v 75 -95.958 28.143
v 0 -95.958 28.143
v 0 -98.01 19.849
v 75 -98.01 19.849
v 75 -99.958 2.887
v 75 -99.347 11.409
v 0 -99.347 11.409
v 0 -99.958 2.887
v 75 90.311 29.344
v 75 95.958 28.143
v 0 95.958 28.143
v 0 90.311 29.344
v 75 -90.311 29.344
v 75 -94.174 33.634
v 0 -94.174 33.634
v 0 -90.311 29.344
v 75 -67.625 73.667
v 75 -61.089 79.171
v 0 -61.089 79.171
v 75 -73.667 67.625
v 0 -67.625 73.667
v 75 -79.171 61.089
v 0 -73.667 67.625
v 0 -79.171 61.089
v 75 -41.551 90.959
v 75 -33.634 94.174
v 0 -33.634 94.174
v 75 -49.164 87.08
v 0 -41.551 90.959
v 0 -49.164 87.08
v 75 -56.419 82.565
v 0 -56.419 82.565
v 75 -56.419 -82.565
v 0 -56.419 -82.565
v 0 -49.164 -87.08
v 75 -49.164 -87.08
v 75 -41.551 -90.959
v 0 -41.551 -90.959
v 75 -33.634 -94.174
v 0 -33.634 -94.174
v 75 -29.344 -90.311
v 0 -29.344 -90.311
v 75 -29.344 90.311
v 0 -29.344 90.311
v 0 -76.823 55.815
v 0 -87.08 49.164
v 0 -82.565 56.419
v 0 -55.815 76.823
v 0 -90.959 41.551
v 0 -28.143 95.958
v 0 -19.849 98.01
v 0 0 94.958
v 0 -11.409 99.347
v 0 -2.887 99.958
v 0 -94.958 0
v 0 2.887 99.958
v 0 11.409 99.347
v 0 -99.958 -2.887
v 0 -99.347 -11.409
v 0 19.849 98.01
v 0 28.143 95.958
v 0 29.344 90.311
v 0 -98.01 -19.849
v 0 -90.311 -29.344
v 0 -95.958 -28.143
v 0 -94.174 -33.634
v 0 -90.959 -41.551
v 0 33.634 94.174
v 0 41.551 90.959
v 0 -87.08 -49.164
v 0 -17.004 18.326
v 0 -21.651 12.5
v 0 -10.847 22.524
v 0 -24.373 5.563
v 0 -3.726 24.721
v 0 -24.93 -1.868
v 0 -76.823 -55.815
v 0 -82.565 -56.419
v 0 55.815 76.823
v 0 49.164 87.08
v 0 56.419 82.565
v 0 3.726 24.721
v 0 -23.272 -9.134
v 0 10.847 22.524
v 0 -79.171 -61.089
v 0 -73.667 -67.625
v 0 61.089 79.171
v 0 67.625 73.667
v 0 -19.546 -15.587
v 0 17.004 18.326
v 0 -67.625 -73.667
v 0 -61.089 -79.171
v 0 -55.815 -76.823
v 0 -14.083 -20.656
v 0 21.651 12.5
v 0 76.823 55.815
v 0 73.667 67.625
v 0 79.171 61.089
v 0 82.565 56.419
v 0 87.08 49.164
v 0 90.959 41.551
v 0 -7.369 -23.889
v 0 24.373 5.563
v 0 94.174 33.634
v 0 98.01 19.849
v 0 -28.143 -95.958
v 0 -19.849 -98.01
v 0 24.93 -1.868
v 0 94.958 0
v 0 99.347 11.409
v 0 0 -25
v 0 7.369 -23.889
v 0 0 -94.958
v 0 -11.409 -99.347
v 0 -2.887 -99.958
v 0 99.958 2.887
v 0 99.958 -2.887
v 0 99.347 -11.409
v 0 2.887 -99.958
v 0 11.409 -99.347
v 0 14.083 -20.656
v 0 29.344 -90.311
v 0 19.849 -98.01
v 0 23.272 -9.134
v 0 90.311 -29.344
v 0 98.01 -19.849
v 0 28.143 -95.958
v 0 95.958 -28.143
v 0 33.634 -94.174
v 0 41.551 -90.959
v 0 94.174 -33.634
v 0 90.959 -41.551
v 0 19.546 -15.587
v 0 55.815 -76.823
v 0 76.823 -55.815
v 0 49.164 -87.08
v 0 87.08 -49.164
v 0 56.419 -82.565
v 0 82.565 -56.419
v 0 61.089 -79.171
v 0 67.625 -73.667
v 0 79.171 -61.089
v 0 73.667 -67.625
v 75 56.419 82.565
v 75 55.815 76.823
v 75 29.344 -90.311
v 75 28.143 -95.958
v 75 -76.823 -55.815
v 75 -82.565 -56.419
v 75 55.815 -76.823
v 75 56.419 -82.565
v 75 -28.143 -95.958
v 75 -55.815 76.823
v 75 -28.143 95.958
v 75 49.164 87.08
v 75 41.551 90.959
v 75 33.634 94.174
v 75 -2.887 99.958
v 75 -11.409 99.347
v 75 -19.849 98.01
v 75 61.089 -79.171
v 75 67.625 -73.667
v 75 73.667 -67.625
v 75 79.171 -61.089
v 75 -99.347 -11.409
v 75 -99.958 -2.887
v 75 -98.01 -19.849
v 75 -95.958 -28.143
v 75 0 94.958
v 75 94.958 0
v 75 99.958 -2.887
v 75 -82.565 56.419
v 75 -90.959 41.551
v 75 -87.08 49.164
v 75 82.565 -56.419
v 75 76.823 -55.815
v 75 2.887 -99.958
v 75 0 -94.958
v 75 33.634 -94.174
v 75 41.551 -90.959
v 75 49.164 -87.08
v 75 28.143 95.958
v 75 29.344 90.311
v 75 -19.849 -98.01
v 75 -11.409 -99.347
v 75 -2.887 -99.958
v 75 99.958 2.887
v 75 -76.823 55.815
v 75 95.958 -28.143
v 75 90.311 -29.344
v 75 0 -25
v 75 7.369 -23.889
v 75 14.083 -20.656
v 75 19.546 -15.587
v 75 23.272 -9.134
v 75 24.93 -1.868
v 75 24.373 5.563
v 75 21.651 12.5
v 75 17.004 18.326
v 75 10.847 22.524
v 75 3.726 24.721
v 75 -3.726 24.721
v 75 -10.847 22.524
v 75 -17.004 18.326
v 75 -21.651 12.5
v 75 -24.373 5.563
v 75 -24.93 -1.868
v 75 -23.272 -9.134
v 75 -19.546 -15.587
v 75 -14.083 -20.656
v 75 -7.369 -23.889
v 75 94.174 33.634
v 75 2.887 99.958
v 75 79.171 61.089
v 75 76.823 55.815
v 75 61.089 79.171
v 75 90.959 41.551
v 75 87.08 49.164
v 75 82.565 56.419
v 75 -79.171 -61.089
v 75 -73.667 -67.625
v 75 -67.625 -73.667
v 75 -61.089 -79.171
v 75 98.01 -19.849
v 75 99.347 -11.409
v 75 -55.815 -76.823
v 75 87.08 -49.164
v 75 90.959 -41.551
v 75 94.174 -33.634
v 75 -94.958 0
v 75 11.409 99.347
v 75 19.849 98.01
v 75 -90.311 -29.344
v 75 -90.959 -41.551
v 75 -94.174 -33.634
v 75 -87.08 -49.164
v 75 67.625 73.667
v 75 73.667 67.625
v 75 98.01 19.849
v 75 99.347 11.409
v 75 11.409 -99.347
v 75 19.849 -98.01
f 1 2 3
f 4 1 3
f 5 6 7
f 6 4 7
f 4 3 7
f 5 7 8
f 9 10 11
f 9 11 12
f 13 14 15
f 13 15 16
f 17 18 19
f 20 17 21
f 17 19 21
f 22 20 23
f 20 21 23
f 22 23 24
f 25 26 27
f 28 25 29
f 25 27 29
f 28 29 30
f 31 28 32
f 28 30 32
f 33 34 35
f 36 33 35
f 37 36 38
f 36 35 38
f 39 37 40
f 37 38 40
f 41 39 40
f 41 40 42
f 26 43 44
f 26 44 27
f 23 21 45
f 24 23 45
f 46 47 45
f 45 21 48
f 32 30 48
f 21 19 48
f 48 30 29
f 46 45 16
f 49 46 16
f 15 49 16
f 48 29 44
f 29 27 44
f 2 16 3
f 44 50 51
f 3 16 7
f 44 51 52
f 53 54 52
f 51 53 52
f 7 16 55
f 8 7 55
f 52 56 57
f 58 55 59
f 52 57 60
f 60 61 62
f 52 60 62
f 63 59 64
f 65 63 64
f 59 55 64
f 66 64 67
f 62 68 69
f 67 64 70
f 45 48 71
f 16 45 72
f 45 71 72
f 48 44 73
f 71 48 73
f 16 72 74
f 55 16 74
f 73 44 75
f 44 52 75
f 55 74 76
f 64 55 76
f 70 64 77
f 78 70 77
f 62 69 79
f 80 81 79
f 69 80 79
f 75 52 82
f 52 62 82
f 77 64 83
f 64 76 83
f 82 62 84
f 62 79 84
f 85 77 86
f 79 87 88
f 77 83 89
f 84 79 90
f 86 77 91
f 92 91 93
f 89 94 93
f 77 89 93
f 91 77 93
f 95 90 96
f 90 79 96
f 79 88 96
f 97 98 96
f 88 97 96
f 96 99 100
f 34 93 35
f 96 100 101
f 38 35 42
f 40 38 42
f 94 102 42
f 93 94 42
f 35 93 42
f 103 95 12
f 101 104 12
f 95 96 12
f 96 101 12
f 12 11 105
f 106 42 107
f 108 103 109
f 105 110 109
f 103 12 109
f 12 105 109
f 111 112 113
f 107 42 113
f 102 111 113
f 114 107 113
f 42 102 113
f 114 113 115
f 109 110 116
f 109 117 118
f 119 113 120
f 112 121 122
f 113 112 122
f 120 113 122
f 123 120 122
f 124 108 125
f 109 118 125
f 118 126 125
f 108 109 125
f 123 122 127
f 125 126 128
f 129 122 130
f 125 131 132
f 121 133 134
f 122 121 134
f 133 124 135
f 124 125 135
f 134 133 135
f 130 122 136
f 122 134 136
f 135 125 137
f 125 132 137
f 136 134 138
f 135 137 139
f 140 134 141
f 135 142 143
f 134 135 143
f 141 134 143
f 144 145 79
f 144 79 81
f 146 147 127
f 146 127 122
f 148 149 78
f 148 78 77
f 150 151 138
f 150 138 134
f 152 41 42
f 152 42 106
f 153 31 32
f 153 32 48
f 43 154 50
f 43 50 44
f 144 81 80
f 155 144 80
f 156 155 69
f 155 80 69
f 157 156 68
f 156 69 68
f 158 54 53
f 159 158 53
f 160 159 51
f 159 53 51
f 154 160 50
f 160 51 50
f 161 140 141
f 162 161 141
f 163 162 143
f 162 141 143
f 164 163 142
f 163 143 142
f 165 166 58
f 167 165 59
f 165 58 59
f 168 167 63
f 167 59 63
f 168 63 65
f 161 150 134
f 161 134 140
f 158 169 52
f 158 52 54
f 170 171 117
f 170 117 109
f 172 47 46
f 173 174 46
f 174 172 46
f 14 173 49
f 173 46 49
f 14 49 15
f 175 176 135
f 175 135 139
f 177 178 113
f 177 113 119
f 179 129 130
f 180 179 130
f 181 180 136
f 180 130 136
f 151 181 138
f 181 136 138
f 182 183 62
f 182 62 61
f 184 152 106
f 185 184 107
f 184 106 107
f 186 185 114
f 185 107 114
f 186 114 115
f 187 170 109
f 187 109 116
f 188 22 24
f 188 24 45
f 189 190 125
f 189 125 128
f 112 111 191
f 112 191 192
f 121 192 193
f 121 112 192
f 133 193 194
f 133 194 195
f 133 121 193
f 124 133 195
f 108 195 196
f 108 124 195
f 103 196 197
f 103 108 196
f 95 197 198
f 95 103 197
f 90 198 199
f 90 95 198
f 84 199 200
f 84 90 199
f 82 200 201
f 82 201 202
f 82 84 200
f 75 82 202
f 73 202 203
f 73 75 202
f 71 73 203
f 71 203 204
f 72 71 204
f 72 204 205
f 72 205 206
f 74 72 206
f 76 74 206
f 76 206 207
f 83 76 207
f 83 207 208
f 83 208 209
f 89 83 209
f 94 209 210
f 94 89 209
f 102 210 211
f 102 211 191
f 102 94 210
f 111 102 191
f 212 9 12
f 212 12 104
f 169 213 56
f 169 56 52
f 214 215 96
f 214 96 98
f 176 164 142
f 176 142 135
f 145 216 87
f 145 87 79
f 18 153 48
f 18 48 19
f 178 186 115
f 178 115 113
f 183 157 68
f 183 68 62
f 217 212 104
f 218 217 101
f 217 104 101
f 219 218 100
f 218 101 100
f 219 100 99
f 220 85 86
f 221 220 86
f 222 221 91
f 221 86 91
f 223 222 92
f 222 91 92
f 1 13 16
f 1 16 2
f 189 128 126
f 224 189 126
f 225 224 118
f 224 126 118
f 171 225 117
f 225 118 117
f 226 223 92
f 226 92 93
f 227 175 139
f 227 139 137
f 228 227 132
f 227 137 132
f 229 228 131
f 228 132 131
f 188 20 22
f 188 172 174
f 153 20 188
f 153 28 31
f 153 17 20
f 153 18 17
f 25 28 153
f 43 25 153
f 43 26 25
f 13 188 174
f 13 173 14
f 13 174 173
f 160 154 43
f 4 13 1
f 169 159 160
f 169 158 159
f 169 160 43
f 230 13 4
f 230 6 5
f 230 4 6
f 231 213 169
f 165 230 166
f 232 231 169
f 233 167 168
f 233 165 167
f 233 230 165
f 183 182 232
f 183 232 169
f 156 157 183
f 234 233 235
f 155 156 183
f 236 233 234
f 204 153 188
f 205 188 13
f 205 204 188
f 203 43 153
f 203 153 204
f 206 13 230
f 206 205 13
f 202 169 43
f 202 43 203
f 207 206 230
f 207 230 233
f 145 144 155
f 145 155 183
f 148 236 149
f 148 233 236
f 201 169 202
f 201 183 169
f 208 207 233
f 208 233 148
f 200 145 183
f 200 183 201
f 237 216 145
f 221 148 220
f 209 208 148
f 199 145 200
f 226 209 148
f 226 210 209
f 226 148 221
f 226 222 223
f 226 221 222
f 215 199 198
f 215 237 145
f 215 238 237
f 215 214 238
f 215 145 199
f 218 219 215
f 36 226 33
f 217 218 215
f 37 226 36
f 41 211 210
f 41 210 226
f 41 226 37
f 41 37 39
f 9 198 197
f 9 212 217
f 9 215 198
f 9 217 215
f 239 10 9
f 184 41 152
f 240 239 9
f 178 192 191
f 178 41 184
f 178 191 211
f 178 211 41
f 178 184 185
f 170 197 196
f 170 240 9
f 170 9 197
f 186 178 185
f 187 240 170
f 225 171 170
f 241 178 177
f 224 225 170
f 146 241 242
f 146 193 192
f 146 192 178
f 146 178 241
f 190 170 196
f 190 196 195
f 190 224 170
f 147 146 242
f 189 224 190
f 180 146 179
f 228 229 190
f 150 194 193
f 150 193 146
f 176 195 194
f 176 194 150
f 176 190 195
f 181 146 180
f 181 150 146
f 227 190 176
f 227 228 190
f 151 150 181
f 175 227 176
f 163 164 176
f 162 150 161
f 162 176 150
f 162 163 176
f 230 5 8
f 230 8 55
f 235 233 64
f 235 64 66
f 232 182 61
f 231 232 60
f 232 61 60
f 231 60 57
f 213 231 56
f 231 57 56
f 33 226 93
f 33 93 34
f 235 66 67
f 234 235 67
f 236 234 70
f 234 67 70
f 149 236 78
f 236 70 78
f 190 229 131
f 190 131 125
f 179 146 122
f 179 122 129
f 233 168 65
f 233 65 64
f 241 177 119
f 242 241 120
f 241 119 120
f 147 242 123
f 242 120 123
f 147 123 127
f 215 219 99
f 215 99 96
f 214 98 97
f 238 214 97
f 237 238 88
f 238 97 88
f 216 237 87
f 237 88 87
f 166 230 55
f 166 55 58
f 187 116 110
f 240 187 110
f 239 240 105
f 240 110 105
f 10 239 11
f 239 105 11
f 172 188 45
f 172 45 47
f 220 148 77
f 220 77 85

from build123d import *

# Parameters (mm, degrees)
SKETCH1_R           = 100
SKETCH1_R_2         = 25
BOSS_EXTRUDE1_DEPTH = 75
CUT_EXTRUDE1_DEPTH  = 161.078105936
CIRPATTERN1_COUNT   = 20


with BuildPart() as part:
    # Sketch1 → Boss-Extrude1 (new body)
    with BuildSketch(Plane(origin=(0, 0, 0), x_dir=(0, 0, -1), z_dir=(1, 0, 0))):
        Circle(SKETCH1_R)
        Circle(SKETCH1_R_2, mode=Mode.SUBTRACT)
    extrude(amount=BOSS_EXTRUDE1_DEPTH)

    # Sketch2 → Cut-Extrude1 (cut, through all)
    with BuildSketch(Plane(origin=(75, 0, 0), x_dir=(0, 0, -1), z_dir=(1, 0, 0))):
        with BuildLine():
            Line((2.886751346, 99.958324649), (0, 94.958324649))
            Line((0, 94.958324649), (-2.886751346, 99.958324649))
            ThreePointArc((-2.886751346, 99.958324649), (0, 100), (2.886751346, 99.958324649))
        make_face()
    cut_extrude1 = extrude(amount=-CUT_EXTRUDE1_DEPTH, mode=Mode.SUBTRACT)

    # CirPattern1: Cut-Extrude1 ×20 about axis
    cirpattern1_axis = Axis((0, 0, 0), (1, 0, 0))
    for i in range(1, CIRPATTERN1_COUNT):
        add(cut_extrude1.rotate(cirpattern1_axis, i * 360 / CIRPATTERN1_COUNT), mode=Mode.SUBTRACT)


solid = part.part
